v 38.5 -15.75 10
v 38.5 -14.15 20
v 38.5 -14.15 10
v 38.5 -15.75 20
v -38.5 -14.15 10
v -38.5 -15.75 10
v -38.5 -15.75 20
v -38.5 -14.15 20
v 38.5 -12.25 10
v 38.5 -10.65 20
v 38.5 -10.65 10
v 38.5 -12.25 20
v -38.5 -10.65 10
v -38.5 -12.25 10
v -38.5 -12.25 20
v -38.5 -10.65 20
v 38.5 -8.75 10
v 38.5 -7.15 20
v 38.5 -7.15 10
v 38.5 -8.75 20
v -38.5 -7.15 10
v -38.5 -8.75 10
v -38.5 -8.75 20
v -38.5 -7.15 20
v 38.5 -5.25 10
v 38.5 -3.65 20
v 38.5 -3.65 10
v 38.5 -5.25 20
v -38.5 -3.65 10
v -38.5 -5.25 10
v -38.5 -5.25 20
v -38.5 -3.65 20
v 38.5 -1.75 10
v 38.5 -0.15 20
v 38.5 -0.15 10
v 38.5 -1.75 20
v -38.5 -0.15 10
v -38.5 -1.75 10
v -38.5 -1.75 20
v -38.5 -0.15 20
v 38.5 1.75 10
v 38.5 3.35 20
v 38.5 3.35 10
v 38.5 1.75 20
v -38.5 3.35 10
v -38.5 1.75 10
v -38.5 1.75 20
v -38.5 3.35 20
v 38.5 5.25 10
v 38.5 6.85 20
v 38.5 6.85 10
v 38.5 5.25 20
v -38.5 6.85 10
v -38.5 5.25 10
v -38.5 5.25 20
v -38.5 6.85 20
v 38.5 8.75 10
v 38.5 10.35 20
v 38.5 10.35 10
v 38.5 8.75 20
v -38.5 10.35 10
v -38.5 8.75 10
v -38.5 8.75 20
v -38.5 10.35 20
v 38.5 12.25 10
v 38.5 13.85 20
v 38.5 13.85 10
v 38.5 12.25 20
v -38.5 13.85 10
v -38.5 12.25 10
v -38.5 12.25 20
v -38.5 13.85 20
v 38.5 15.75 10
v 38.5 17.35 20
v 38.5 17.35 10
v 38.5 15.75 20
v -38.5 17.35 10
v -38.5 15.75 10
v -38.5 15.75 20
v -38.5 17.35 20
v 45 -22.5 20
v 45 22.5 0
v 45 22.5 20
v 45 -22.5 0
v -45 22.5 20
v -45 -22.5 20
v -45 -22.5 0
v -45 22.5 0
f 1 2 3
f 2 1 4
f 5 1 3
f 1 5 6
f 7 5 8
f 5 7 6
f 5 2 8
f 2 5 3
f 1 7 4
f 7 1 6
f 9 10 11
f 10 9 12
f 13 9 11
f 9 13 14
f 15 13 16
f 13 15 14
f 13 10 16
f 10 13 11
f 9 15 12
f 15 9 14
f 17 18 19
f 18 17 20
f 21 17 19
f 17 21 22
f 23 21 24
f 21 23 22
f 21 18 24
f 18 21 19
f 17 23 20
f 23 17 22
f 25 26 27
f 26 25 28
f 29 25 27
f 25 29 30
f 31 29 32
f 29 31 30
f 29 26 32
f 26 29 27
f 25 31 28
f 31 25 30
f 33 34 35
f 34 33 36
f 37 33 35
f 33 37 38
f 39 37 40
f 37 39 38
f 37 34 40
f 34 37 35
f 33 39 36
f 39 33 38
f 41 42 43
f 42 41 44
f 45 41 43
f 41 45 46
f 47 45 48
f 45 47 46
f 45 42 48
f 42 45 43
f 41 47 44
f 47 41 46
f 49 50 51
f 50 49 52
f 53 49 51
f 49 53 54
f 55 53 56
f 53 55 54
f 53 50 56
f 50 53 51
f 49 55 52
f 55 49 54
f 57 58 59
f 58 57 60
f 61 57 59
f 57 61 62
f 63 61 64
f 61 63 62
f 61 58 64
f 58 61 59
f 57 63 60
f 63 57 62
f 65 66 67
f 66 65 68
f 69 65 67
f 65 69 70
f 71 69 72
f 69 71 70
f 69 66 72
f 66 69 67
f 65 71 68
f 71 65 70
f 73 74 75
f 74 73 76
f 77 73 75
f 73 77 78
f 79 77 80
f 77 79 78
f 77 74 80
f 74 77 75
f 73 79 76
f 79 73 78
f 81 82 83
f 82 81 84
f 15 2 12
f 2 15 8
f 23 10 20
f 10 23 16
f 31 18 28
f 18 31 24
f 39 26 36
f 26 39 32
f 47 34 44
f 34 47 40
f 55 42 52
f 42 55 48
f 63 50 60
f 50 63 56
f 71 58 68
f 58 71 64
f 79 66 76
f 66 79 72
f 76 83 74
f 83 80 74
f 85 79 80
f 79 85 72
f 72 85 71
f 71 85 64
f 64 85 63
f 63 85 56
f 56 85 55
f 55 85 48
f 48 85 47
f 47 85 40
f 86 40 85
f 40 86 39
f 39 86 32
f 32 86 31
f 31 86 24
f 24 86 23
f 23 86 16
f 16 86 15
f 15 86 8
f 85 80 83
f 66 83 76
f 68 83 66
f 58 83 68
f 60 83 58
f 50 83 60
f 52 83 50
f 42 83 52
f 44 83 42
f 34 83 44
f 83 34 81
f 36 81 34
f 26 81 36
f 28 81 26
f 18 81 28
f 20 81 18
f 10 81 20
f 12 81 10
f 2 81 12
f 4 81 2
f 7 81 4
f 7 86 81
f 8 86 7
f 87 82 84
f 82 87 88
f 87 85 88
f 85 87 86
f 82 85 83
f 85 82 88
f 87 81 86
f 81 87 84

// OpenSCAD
// Drying rack for 10 microscope slides
// Print orientation: base on XY plane, slots open upward (+Z)

$fn = 64;

// ---- Block dimensions ----
block_x = 90;        // block length (X)
block_y = 45;        // block width (Y)
block_z = 20;        // block height (Z)

// ---- Slot dimensions ----
slot_n     = 10;     // number of slots
slot_len   = 77;     // slot length along X
slot_w     = 1.6;    // slot width along Y
slot_depth = 10;     // slot depth from top face

// ---- Layout ----
slot_pitch = 3.5;    // centre-to-centre spacing in Y
group_y    = 0;      // Y position of the slot group (will be centred)

// ---- Cutting overlap ----
eps = 0.5;           // extension past top face to avoid coplanar faces

// Y position of first slot so the group is centred on the block
first_y = group_y - (slot_n - 1) * slot_pitch / 2;

difference() {
    // Solid base block, centred in X and Y, resting on z = 0
    translate([-block_x / 2, -block_y / 2, 0])
        cube([block_x, block_y, block_z]);

    // 10 parallel slots, open at the top
    for (i = [0 : slot_n - 1])
        translate([-slot_len / 2, first_y + i * slot_pitch, block_z - slot_depth])
            cube([slot_len, slot_w, slot_depth + eps]);
}
